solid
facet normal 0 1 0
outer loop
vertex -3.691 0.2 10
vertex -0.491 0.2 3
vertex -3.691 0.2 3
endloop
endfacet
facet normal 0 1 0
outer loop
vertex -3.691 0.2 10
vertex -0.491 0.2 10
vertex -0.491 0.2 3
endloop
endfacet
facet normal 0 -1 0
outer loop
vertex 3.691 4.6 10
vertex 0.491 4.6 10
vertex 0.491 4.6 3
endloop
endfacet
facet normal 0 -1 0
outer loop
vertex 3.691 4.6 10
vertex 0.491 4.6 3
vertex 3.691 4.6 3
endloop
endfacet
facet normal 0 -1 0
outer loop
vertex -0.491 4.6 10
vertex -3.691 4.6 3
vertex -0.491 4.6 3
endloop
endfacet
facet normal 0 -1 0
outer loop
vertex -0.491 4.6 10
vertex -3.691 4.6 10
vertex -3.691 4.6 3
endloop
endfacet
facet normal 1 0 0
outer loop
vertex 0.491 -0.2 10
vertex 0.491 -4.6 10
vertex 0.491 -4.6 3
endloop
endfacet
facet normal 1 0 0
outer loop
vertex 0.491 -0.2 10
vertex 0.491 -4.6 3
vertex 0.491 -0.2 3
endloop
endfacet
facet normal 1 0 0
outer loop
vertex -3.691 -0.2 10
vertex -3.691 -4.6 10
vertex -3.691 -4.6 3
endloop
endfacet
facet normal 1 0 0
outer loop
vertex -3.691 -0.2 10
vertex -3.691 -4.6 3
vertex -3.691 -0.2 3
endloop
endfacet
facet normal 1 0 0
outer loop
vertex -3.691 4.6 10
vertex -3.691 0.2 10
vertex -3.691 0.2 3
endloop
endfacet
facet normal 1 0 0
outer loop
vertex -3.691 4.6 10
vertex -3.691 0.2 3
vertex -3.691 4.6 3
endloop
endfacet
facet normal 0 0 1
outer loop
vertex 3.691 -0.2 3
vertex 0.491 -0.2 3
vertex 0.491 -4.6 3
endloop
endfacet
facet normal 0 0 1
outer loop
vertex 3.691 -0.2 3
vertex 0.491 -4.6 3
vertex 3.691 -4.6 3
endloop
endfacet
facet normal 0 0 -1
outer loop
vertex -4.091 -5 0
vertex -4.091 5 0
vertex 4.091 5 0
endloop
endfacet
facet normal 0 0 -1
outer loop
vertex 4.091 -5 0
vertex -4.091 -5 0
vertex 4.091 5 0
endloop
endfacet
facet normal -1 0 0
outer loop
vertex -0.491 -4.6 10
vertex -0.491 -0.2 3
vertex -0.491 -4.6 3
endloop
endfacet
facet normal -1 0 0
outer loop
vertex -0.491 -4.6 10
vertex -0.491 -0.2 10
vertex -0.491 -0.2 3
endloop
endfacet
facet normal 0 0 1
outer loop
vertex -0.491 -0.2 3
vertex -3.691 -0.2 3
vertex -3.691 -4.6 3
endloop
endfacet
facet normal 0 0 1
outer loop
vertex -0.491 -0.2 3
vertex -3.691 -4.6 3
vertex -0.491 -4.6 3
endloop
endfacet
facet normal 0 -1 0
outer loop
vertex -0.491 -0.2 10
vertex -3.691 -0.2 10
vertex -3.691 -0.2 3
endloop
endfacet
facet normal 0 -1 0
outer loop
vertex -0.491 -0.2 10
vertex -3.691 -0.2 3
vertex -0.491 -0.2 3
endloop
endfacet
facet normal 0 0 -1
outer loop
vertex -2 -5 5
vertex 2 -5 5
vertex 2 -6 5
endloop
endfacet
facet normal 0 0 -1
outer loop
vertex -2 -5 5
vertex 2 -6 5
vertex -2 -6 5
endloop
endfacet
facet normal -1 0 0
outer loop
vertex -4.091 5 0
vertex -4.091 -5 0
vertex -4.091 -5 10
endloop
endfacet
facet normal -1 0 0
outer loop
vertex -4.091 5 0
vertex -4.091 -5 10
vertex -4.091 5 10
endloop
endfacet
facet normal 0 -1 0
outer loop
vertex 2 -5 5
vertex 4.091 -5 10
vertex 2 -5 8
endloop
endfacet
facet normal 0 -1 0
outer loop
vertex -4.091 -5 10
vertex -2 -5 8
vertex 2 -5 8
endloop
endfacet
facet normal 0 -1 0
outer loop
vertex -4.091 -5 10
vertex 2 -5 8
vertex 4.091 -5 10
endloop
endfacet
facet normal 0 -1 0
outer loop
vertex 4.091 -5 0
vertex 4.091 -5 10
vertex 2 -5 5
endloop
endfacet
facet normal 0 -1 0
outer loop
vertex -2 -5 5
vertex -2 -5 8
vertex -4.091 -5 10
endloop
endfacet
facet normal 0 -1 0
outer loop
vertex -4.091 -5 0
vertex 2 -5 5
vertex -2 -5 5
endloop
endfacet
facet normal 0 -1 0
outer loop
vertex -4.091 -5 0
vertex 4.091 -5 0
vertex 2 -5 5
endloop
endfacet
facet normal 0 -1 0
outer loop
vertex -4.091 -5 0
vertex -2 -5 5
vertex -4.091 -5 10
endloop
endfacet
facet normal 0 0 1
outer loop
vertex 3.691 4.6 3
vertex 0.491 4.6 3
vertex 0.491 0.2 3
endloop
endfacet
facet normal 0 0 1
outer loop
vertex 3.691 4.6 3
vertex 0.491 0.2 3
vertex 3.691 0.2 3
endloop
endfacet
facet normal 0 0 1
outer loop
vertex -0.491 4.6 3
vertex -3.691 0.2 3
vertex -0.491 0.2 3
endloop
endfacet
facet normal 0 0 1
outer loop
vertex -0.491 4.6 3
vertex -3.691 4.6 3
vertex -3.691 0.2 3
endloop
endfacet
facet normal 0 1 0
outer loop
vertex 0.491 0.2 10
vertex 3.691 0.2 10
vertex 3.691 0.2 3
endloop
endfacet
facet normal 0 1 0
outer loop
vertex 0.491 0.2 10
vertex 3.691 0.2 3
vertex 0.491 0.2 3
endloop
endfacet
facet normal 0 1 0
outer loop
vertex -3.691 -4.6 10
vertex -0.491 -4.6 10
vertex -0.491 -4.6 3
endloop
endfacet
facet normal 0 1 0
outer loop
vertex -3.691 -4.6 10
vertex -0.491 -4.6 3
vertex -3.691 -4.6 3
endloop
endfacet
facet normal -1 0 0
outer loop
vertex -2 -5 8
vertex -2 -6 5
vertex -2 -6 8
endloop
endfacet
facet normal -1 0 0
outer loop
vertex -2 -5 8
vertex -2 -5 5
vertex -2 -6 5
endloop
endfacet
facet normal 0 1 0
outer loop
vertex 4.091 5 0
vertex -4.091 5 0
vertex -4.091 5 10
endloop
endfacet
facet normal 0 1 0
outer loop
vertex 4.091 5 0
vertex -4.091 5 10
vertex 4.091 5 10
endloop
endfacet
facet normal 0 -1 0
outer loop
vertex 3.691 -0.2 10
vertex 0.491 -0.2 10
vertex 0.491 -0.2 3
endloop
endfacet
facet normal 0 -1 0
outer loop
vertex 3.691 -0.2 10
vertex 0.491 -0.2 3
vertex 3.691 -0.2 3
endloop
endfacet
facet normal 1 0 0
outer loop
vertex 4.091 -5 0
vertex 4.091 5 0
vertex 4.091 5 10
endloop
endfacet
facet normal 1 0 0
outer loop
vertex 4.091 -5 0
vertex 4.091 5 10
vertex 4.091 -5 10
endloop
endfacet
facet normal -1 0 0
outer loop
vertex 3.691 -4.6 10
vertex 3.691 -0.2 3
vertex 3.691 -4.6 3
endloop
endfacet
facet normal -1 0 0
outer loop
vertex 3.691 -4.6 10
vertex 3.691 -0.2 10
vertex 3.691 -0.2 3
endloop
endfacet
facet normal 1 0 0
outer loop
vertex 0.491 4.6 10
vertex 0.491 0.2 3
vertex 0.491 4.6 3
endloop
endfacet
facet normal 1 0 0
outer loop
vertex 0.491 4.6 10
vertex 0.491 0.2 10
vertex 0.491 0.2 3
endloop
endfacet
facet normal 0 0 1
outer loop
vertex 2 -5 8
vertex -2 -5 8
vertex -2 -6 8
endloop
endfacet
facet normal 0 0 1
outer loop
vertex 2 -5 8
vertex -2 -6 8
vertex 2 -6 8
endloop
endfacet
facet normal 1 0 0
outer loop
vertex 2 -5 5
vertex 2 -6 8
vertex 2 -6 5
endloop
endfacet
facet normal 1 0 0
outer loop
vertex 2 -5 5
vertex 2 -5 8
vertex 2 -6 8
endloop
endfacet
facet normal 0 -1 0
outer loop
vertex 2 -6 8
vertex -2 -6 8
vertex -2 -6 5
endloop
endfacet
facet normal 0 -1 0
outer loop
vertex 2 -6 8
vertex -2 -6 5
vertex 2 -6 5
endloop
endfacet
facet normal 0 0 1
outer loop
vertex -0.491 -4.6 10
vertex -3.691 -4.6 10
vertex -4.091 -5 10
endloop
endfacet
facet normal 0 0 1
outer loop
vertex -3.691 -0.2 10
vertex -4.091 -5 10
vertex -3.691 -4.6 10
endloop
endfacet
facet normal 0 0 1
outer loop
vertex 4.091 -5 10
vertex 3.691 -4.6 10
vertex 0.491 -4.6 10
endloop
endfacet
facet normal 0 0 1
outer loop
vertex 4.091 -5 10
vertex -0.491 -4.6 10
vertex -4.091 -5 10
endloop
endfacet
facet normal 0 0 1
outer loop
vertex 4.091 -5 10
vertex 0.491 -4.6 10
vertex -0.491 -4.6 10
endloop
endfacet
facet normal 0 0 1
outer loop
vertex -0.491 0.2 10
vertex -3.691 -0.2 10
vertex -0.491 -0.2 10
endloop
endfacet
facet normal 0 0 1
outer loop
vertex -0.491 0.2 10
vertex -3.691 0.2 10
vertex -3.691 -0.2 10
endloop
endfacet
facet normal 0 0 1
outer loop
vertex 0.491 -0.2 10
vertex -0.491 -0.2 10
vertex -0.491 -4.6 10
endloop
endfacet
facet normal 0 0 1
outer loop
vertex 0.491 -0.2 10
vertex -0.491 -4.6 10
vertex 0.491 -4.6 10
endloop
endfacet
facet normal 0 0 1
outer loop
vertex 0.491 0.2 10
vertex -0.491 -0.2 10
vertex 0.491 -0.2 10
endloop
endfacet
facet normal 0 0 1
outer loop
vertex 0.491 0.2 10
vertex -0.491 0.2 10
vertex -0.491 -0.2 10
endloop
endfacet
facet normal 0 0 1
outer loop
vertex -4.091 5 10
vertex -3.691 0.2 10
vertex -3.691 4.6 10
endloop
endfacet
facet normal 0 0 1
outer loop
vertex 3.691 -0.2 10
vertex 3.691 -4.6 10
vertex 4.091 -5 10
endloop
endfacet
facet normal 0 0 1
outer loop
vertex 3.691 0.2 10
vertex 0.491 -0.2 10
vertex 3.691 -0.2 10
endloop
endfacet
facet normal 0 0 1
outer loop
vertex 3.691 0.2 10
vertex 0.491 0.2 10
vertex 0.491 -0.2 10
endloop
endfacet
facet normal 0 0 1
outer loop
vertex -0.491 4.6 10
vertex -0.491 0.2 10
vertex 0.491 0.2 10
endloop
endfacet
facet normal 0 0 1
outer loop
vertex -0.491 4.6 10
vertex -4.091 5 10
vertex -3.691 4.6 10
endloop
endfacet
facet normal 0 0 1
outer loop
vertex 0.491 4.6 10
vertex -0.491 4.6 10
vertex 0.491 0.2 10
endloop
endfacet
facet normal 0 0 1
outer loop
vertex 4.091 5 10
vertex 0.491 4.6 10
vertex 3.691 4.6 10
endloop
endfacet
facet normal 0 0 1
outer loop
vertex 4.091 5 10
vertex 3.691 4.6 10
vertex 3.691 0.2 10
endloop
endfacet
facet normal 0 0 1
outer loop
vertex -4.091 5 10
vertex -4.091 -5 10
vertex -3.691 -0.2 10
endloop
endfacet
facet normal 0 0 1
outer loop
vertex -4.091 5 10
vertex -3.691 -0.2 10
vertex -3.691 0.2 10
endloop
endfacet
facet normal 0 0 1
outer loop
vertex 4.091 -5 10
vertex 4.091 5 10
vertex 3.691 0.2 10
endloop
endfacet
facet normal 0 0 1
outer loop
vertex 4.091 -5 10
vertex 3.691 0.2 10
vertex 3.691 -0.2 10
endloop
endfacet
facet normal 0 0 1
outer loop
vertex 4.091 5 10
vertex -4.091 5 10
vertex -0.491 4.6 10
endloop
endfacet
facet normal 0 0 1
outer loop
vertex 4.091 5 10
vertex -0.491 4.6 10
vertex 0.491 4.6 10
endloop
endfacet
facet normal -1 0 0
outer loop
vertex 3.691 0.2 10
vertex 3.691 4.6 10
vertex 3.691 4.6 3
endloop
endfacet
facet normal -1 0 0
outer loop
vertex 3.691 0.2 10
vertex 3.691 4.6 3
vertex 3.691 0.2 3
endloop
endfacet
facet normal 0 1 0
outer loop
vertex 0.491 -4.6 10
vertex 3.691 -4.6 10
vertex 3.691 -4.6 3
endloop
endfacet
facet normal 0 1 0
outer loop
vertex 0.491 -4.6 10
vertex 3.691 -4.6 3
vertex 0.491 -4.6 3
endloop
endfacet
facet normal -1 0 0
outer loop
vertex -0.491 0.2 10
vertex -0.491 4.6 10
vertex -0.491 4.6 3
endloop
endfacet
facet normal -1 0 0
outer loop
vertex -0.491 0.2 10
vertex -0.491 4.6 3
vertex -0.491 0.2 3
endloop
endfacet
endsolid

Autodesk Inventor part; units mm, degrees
ref_plane "YZ Plane" through (0, 0, 0) normal (1, 0, 0) x (0, 1, 0)
ref_plane "XZ Plane" through (0, 0, 0) normal (0, 1, 0) x (-1, 0, 0)
sketch "Sketch1" plane through (0, 0, 0) normal (0, 0, 1) x (1, 0, 0)
  line L0 (0, 8) -> (0, -6) projected
  line L1 (-4.9092, 0) -> (6.5456, 0) projected
  line L2 (-4.091, 5) -> (4.091, 5)
  line L3 (4.091, 5) -> (4.091, -5)
  line L4 (4.091, -5) -> (-4.091, -5)
  line L5 (-4.091, -5) -> (-4.091, 5)
  dimension "d0" = 8.182
  dimension "d1" = 10
extrude "Extrusion1" add sketch "Sketch1" along normal blind 10
sketch "Sketch5" plane through (-4.091, -5, 0) normal (0, -1, 0) x (1, 0, 0)
  line L0 (8.182, 10) -> (0, 10)
  line L1 (2.091, 8) -> (6.091, 8)
  line L2 (6.091, 8) -> (6.091, 5)
  line L3 (6.091, 5) -> (2.091, 5)
  line L4 (2.091, 5) -> (2.091, 8)
  point P0 (4.091, 8)
  point P1 (4.091, 10)
  dimension "d20" = 4
  dimension "d21" = 3
  dimension "d22" = 2
extrude "Extrusion5" add sketch "Sketch5" along normal blind 1
ref_plane "Work Plane1" through (0, 0, 10) normal (0, 0, 1) x (1, 0, 0)
sketch "Sketch11" plane through (0, 0, 10) normal (0, 0, 1) x (1, 0, 0)
  line L0 (-0.491, -4.6) -> (-3.691, -4.6)
  line L1 (-3.691, -4.6) -> (-3.691, -0.2)
  line L2 (-3.691, -0.2) -> (-0.491, -0.2)
  line L3 (-0.491, -0.2) -> (-0.491, -4.6)
  line L4 (-4.091, -5) -> (-4.091, 5) projected
  line L5 (4.091, -5) -> (-4.091, -5) projected
  dimension "d57" = 0.4
  dimension "d58" = 0.4
  dimension "d59" = 3.2
  dimension "d60" = 4.4
extrude "Extrusion11" cut sketch "Sketch11" against normal blind 7
pattern_linear "Rectangular Pattern3" count 2 spacing 4.182 along (1, 0, 0) count 2 spacing 4.8 along (0, 1, 0) of "Extrusion11"
properties part number "Power Supply Header 2"
